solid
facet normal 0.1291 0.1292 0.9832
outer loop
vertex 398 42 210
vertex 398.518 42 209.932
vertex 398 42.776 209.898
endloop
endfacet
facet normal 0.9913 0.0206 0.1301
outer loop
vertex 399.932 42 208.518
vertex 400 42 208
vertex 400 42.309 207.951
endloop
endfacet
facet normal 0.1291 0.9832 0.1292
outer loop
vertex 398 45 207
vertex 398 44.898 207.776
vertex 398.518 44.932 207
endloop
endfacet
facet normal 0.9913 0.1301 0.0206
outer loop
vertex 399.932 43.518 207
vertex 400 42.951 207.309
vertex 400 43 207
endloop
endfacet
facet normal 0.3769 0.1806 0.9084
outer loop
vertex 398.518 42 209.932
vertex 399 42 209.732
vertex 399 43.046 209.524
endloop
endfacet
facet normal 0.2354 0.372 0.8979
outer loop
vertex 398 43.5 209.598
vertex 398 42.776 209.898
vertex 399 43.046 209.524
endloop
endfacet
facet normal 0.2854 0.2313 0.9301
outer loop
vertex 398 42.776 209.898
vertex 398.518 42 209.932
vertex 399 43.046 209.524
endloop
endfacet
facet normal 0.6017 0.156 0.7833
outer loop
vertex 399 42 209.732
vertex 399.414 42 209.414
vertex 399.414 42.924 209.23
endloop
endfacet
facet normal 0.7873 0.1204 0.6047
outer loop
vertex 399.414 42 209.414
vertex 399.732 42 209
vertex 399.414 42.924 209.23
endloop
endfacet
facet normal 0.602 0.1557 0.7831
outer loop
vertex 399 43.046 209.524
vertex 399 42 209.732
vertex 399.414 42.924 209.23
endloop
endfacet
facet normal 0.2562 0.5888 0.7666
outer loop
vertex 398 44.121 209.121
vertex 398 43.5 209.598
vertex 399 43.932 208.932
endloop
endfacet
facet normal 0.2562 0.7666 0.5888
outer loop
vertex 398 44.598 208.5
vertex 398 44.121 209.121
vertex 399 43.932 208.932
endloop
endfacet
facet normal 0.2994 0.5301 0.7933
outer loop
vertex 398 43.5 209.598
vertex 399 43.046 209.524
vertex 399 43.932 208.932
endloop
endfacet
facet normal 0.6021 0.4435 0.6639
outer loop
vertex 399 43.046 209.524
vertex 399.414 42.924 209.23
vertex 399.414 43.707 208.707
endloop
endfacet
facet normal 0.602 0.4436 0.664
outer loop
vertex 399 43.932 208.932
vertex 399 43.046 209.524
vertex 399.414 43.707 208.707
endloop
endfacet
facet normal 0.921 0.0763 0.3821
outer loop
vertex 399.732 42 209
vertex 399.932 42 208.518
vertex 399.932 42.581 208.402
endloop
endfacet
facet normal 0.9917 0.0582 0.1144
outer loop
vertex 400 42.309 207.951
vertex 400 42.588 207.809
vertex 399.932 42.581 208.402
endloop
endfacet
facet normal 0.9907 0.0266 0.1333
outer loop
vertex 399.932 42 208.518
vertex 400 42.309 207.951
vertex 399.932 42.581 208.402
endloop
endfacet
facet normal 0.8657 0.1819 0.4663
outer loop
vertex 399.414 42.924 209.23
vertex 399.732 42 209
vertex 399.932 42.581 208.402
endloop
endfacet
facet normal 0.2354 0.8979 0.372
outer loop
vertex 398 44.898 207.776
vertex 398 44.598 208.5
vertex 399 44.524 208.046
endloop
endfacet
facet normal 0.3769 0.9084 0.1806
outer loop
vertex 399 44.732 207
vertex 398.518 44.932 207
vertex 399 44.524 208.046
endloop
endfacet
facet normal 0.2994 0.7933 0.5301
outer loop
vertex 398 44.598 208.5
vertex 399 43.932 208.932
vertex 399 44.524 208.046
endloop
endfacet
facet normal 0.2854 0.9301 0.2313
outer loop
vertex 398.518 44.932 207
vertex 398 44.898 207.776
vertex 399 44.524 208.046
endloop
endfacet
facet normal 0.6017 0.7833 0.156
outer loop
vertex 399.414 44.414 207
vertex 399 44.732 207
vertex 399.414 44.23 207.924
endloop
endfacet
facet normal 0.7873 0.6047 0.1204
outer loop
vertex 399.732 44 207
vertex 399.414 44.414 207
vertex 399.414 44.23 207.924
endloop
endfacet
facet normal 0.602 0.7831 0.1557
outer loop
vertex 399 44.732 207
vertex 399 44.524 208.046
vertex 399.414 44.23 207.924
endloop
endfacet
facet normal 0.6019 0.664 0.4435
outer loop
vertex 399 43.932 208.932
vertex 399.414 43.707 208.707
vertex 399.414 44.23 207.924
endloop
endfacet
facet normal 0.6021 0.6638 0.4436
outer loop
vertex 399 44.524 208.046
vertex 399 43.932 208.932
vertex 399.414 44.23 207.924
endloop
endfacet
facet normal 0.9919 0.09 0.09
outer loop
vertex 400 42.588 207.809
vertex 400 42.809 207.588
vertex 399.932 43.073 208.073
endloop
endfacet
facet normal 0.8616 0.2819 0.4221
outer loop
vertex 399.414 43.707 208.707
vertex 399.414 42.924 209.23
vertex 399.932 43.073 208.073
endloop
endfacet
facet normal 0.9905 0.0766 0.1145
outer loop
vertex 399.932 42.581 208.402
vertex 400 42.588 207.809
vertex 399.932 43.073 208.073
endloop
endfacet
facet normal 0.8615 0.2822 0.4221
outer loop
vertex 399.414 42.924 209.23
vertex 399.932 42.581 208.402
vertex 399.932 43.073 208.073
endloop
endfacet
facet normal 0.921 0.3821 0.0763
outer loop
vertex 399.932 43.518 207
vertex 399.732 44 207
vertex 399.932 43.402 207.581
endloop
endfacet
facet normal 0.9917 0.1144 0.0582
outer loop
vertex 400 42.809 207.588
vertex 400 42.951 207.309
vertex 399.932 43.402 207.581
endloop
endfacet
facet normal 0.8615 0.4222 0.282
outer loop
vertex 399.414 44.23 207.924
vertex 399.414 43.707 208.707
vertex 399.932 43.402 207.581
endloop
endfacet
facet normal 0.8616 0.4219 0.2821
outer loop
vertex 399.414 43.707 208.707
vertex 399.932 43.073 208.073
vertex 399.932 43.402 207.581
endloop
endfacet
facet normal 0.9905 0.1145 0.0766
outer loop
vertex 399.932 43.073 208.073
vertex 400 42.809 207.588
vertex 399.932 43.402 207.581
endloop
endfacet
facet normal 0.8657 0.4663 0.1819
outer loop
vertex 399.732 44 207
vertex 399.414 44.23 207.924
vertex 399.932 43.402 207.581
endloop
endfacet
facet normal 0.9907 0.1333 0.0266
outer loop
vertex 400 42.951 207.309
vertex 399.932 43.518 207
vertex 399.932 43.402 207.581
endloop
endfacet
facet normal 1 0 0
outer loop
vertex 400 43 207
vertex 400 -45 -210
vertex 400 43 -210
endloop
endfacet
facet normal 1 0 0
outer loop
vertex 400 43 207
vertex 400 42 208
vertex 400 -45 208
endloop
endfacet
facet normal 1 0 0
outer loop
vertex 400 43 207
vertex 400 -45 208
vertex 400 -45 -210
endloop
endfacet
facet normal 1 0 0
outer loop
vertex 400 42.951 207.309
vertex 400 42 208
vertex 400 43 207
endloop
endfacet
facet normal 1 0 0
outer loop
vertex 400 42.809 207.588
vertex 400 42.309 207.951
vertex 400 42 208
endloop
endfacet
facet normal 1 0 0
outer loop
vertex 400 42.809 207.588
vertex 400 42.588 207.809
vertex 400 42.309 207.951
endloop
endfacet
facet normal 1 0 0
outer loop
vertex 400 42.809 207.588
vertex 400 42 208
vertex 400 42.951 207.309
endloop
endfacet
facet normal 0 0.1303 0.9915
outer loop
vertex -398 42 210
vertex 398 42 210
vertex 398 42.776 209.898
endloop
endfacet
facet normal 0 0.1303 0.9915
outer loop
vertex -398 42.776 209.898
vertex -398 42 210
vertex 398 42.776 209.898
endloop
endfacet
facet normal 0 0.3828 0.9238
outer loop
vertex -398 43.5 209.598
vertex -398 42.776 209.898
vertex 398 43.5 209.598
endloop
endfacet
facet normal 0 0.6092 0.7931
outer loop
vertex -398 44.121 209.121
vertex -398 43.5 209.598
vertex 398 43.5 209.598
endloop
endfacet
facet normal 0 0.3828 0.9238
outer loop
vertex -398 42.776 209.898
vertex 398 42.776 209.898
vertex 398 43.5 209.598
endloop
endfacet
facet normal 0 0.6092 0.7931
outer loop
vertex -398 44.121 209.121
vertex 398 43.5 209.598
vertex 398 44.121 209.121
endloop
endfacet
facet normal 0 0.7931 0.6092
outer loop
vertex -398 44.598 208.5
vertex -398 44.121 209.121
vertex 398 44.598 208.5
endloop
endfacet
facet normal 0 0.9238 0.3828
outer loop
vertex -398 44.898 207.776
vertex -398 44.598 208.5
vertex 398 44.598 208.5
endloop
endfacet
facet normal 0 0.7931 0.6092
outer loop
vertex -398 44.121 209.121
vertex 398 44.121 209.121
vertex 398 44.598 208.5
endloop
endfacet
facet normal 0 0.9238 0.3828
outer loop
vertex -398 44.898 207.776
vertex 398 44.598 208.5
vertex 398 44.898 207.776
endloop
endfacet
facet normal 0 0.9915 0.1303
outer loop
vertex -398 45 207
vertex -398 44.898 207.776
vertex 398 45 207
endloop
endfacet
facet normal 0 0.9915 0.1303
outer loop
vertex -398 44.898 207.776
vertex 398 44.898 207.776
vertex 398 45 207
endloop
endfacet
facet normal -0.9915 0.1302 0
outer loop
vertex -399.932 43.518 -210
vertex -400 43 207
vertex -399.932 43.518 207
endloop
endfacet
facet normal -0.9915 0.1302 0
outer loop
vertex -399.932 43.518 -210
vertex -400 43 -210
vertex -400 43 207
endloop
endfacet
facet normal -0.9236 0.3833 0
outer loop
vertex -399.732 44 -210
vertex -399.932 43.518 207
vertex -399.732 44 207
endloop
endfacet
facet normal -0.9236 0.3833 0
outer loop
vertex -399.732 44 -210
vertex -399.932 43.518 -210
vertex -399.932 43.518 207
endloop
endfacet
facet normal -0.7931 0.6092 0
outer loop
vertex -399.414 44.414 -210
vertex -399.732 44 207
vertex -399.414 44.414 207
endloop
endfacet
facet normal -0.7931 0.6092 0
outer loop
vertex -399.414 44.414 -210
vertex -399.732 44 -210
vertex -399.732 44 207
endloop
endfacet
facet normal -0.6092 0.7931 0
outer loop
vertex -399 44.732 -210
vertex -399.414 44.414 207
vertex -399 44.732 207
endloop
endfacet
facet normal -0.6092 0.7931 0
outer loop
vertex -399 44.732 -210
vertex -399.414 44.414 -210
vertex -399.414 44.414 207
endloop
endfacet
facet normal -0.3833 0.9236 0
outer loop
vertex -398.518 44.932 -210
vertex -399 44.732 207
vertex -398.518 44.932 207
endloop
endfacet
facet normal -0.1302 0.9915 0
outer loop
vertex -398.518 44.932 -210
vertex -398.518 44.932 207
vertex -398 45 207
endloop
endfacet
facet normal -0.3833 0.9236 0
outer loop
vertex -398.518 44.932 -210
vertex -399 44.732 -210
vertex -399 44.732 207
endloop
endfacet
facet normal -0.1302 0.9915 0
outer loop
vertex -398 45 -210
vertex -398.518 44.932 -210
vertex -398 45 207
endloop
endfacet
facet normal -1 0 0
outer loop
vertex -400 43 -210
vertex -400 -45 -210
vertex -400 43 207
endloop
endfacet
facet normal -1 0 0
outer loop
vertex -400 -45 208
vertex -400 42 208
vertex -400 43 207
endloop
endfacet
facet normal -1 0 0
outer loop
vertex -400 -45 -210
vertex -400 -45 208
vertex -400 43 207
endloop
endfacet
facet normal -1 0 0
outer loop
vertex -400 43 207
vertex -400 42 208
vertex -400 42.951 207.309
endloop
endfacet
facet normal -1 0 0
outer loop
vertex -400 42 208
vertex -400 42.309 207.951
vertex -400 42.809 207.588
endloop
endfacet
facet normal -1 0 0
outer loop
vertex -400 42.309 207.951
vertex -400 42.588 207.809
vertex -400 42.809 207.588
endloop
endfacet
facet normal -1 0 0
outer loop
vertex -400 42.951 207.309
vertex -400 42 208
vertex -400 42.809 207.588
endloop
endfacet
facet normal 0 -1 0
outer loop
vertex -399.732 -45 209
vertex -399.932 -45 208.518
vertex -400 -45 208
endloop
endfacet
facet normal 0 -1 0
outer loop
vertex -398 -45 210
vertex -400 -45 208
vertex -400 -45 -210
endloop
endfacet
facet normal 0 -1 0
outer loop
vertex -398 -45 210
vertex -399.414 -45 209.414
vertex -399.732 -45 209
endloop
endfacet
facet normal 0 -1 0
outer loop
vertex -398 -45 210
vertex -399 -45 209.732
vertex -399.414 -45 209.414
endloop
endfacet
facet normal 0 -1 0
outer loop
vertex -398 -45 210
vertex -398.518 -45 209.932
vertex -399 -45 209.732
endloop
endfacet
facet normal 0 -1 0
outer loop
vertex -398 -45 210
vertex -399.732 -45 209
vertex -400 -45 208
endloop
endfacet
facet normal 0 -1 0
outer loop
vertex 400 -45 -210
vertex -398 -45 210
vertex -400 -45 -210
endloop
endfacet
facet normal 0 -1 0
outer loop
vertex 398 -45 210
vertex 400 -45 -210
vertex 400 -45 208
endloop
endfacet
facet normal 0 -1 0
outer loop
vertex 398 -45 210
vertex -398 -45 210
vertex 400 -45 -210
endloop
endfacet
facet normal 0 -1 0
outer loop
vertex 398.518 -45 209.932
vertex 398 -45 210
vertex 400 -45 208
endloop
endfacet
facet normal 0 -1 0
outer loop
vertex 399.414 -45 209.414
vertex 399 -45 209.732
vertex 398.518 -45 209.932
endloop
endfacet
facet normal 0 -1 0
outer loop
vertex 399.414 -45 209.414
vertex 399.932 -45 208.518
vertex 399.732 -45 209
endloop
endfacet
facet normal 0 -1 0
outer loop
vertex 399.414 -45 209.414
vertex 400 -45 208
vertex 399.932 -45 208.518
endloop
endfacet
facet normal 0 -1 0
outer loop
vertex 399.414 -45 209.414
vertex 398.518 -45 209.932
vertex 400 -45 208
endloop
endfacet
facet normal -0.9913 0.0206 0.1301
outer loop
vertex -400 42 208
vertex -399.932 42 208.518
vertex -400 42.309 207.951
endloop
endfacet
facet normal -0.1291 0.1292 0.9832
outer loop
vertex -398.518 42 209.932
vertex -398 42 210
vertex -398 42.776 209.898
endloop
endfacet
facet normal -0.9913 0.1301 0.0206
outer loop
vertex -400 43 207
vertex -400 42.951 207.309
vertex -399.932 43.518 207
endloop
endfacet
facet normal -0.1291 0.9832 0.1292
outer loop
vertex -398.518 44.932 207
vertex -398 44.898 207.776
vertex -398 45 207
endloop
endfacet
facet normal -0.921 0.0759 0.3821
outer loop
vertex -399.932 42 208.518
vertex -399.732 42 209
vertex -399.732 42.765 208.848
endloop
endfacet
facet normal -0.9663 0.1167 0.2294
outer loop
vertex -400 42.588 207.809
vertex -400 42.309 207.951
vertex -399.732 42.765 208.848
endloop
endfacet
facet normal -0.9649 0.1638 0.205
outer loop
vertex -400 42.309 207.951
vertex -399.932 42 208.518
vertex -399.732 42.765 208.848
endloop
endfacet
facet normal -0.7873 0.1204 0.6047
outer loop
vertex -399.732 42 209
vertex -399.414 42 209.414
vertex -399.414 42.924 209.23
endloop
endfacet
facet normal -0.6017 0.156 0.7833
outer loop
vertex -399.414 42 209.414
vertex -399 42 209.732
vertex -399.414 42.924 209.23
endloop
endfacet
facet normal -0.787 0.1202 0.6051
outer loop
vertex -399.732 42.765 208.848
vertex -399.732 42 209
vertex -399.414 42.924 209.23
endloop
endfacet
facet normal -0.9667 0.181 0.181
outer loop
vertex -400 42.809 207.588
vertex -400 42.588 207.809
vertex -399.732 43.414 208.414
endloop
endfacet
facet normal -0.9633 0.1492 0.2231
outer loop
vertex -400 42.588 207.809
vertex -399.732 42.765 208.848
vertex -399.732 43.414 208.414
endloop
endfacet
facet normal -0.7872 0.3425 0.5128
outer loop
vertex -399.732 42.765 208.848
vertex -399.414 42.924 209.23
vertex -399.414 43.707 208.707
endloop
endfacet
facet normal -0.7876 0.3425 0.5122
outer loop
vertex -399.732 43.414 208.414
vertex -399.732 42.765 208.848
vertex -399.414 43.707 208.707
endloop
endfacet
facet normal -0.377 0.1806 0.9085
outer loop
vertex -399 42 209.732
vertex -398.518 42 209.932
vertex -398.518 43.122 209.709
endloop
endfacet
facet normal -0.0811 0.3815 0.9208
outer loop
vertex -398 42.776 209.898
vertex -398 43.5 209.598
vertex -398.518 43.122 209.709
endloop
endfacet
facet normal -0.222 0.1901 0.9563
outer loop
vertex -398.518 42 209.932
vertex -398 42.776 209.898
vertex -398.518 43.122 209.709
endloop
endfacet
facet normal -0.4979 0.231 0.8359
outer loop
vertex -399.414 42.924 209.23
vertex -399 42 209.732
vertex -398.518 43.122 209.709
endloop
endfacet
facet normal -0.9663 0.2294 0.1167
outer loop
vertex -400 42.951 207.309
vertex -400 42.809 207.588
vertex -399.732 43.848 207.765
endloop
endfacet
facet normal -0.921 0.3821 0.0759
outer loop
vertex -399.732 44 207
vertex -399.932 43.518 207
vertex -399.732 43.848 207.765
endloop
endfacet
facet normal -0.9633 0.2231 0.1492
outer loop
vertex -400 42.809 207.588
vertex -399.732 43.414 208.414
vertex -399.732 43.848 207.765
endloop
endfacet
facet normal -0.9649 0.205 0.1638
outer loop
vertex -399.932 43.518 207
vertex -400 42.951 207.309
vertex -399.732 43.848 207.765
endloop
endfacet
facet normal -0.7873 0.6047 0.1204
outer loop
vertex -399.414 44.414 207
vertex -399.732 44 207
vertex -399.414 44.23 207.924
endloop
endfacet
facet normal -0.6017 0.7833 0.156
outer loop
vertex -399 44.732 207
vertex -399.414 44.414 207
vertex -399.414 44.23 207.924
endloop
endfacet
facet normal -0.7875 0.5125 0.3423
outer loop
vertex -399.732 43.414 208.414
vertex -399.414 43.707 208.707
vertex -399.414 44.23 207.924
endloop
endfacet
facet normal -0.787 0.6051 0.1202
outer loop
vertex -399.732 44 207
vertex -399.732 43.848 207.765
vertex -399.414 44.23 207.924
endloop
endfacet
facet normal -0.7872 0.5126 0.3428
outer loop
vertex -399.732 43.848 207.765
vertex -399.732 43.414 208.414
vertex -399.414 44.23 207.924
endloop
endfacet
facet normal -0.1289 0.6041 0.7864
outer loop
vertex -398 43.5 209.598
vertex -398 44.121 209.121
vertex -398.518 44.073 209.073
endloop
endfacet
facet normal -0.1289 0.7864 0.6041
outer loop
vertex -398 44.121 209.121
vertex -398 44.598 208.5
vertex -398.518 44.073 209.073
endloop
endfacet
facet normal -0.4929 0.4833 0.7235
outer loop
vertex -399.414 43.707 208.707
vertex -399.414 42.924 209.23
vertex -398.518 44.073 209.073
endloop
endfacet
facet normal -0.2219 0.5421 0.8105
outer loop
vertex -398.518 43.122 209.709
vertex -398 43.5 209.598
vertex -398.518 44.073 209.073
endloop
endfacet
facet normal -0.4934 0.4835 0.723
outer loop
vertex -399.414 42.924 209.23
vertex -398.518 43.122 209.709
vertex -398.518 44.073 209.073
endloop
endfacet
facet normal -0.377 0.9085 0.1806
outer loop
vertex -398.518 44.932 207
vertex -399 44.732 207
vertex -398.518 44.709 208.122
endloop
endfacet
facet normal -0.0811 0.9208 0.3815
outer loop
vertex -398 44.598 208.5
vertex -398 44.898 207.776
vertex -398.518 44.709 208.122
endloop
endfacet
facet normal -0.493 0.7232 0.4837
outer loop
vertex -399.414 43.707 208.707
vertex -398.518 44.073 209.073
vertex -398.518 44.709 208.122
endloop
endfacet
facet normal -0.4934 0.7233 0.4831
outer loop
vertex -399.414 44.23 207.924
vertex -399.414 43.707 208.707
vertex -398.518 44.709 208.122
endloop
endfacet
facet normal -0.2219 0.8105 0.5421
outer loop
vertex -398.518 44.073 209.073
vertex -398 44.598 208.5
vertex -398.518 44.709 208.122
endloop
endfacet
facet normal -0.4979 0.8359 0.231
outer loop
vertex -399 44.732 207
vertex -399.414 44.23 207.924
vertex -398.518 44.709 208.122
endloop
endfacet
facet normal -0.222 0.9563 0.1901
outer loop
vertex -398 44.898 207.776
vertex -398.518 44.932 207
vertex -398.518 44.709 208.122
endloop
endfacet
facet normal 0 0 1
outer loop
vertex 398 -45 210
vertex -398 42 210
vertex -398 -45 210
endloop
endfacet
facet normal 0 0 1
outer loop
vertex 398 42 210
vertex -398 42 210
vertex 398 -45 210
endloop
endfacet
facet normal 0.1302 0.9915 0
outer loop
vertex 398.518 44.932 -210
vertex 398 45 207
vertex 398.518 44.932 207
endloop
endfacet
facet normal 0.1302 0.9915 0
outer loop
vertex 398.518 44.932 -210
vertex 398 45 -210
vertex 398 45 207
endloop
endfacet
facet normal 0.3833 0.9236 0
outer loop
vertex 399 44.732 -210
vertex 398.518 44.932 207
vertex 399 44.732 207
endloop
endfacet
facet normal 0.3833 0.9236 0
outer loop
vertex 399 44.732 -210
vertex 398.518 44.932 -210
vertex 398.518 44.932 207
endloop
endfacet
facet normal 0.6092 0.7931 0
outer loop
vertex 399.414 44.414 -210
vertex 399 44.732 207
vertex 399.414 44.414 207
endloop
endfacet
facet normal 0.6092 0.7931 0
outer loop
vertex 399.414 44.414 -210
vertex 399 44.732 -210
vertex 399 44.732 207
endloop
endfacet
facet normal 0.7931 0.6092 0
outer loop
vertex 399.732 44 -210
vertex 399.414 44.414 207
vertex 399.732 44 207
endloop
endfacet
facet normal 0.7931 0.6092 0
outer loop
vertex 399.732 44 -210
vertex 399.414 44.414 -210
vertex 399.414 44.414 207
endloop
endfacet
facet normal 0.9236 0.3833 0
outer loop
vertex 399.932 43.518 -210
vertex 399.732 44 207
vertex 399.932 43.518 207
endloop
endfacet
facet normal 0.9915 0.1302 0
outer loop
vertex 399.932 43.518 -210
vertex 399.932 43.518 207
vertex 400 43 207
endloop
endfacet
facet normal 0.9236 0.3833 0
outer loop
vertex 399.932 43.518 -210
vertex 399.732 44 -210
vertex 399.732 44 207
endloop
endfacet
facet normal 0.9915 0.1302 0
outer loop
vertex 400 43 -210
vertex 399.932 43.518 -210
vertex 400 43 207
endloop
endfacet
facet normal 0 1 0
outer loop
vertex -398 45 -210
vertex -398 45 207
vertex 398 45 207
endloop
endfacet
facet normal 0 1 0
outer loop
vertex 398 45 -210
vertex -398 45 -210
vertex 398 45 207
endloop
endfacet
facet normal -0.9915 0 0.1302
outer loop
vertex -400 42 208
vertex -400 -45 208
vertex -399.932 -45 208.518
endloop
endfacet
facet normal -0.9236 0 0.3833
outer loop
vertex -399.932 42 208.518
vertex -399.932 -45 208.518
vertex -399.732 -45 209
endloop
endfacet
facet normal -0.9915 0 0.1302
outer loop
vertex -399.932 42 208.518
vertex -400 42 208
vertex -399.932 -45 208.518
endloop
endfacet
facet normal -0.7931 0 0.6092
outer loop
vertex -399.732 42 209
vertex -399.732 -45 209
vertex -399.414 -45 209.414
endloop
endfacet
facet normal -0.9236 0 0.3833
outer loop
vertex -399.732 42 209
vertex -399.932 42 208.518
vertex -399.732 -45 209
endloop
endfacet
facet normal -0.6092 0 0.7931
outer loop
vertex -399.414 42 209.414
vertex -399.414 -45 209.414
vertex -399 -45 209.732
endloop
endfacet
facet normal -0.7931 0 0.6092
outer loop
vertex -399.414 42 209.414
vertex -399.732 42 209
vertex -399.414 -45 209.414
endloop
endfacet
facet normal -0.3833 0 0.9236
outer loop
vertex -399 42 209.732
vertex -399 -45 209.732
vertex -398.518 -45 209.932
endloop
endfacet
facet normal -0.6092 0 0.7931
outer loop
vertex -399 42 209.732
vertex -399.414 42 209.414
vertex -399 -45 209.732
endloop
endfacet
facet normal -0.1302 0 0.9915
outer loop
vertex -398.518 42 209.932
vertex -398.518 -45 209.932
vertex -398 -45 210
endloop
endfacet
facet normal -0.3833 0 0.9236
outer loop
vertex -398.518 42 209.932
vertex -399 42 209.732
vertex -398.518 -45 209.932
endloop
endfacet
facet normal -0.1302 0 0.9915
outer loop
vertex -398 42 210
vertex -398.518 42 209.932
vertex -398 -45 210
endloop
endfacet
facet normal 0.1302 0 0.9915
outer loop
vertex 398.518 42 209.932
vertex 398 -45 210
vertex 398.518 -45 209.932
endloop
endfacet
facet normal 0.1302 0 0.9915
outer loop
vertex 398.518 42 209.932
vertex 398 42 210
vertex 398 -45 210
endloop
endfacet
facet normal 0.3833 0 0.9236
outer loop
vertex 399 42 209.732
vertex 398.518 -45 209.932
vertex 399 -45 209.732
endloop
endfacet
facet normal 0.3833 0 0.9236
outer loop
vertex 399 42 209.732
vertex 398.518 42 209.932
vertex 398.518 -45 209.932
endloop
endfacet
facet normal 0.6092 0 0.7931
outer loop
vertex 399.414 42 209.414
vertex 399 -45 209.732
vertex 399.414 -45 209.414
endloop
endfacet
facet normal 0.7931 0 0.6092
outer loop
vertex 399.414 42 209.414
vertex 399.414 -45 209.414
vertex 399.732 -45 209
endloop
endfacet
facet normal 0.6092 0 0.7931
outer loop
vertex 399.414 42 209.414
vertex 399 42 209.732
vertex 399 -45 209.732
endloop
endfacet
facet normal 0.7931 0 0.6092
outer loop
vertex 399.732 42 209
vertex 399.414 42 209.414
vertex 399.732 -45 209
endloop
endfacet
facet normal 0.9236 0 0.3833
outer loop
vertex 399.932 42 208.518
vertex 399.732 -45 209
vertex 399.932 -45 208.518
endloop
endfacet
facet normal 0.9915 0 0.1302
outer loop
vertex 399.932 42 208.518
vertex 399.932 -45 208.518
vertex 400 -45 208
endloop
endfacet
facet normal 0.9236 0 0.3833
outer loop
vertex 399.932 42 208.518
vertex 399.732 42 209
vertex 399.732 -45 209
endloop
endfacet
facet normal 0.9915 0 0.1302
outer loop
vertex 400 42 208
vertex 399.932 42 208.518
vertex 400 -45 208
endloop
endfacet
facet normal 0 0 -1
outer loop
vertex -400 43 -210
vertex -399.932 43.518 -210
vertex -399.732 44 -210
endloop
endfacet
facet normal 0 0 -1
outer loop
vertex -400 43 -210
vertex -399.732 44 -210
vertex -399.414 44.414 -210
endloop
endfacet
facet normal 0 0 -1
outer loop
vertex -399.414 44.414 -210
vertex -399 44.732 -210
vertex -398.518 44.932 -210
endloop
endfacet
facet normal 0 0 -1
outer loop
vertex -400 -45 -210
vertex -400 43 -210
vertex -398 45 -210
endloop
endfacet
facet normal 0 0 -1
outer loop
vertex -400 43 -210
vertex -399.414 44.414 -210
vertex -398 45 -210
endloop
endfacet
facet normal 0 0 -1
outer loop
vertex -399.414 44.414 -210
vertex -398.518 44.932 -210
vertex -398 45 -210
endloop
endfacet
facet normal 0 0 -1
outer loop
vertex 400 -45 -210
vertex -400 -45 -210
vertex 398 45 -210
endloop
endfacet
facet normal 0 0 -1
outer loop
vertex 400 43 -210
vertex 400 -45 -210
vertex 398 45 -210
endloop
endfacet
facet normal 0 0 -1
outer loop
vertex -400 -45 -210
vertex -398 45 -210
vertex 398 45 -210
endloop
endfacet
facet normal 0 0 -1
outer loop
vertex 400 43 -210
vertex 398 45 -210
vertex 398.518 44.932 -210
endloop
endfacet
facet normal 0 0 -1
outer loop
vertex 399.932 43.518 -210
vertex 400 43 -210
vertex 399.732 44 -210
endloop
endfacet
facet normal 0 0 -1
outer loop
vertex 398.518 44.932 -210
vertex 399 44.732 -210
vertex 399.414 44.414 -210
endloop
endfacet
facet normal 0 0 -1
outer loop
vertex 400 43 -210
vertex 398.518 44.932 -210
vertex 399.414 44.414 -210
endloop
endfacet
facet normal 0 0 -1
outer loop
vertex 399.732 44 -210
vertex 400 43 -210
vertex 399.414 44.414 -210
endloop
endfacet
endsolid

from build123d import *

# Parameters (mm, degrees)
SKETCH2_W           = 800
SKETCH2_H           = 90
BOSS_EXTRUDE1_DEPTH = 210
FILLET1_R           = 3
FILLET2_R           = 2


with BuildPart() as part:
    # Sketch2 → Boss-Extrude1 (new body, symmetric)
    with BuildSketch(Plane.XY):
        Rectangle(SKETCH2_W, SKETCH2_H)
    extrude(amount=BOSS_EXTRUDE1_DEPTH, both=True)

    # Fillet1
    fillet1_edges = [part.edges().sort_by_distance(p)[0] for p in [
        (0, 45, 210),
    ]]
    fillet(fillet1_edges, radius=FILLET1_R)

    # Fillet2
    fillet2_edges = [part.edges().sort_by_distance(p)[0] for p in [
        (-400, -1.5, 210),
        (-400, 45, -1.5),
        (-400, 44.121320344, 209.121320344),
        (400, 45, -1.5),
        (400, 44.121320344, 209.121320344),
        (400, -1.5, 210),
    ]]
    fillet(fillet2_edges, radius=FILLET2_R)


solid = part.part
